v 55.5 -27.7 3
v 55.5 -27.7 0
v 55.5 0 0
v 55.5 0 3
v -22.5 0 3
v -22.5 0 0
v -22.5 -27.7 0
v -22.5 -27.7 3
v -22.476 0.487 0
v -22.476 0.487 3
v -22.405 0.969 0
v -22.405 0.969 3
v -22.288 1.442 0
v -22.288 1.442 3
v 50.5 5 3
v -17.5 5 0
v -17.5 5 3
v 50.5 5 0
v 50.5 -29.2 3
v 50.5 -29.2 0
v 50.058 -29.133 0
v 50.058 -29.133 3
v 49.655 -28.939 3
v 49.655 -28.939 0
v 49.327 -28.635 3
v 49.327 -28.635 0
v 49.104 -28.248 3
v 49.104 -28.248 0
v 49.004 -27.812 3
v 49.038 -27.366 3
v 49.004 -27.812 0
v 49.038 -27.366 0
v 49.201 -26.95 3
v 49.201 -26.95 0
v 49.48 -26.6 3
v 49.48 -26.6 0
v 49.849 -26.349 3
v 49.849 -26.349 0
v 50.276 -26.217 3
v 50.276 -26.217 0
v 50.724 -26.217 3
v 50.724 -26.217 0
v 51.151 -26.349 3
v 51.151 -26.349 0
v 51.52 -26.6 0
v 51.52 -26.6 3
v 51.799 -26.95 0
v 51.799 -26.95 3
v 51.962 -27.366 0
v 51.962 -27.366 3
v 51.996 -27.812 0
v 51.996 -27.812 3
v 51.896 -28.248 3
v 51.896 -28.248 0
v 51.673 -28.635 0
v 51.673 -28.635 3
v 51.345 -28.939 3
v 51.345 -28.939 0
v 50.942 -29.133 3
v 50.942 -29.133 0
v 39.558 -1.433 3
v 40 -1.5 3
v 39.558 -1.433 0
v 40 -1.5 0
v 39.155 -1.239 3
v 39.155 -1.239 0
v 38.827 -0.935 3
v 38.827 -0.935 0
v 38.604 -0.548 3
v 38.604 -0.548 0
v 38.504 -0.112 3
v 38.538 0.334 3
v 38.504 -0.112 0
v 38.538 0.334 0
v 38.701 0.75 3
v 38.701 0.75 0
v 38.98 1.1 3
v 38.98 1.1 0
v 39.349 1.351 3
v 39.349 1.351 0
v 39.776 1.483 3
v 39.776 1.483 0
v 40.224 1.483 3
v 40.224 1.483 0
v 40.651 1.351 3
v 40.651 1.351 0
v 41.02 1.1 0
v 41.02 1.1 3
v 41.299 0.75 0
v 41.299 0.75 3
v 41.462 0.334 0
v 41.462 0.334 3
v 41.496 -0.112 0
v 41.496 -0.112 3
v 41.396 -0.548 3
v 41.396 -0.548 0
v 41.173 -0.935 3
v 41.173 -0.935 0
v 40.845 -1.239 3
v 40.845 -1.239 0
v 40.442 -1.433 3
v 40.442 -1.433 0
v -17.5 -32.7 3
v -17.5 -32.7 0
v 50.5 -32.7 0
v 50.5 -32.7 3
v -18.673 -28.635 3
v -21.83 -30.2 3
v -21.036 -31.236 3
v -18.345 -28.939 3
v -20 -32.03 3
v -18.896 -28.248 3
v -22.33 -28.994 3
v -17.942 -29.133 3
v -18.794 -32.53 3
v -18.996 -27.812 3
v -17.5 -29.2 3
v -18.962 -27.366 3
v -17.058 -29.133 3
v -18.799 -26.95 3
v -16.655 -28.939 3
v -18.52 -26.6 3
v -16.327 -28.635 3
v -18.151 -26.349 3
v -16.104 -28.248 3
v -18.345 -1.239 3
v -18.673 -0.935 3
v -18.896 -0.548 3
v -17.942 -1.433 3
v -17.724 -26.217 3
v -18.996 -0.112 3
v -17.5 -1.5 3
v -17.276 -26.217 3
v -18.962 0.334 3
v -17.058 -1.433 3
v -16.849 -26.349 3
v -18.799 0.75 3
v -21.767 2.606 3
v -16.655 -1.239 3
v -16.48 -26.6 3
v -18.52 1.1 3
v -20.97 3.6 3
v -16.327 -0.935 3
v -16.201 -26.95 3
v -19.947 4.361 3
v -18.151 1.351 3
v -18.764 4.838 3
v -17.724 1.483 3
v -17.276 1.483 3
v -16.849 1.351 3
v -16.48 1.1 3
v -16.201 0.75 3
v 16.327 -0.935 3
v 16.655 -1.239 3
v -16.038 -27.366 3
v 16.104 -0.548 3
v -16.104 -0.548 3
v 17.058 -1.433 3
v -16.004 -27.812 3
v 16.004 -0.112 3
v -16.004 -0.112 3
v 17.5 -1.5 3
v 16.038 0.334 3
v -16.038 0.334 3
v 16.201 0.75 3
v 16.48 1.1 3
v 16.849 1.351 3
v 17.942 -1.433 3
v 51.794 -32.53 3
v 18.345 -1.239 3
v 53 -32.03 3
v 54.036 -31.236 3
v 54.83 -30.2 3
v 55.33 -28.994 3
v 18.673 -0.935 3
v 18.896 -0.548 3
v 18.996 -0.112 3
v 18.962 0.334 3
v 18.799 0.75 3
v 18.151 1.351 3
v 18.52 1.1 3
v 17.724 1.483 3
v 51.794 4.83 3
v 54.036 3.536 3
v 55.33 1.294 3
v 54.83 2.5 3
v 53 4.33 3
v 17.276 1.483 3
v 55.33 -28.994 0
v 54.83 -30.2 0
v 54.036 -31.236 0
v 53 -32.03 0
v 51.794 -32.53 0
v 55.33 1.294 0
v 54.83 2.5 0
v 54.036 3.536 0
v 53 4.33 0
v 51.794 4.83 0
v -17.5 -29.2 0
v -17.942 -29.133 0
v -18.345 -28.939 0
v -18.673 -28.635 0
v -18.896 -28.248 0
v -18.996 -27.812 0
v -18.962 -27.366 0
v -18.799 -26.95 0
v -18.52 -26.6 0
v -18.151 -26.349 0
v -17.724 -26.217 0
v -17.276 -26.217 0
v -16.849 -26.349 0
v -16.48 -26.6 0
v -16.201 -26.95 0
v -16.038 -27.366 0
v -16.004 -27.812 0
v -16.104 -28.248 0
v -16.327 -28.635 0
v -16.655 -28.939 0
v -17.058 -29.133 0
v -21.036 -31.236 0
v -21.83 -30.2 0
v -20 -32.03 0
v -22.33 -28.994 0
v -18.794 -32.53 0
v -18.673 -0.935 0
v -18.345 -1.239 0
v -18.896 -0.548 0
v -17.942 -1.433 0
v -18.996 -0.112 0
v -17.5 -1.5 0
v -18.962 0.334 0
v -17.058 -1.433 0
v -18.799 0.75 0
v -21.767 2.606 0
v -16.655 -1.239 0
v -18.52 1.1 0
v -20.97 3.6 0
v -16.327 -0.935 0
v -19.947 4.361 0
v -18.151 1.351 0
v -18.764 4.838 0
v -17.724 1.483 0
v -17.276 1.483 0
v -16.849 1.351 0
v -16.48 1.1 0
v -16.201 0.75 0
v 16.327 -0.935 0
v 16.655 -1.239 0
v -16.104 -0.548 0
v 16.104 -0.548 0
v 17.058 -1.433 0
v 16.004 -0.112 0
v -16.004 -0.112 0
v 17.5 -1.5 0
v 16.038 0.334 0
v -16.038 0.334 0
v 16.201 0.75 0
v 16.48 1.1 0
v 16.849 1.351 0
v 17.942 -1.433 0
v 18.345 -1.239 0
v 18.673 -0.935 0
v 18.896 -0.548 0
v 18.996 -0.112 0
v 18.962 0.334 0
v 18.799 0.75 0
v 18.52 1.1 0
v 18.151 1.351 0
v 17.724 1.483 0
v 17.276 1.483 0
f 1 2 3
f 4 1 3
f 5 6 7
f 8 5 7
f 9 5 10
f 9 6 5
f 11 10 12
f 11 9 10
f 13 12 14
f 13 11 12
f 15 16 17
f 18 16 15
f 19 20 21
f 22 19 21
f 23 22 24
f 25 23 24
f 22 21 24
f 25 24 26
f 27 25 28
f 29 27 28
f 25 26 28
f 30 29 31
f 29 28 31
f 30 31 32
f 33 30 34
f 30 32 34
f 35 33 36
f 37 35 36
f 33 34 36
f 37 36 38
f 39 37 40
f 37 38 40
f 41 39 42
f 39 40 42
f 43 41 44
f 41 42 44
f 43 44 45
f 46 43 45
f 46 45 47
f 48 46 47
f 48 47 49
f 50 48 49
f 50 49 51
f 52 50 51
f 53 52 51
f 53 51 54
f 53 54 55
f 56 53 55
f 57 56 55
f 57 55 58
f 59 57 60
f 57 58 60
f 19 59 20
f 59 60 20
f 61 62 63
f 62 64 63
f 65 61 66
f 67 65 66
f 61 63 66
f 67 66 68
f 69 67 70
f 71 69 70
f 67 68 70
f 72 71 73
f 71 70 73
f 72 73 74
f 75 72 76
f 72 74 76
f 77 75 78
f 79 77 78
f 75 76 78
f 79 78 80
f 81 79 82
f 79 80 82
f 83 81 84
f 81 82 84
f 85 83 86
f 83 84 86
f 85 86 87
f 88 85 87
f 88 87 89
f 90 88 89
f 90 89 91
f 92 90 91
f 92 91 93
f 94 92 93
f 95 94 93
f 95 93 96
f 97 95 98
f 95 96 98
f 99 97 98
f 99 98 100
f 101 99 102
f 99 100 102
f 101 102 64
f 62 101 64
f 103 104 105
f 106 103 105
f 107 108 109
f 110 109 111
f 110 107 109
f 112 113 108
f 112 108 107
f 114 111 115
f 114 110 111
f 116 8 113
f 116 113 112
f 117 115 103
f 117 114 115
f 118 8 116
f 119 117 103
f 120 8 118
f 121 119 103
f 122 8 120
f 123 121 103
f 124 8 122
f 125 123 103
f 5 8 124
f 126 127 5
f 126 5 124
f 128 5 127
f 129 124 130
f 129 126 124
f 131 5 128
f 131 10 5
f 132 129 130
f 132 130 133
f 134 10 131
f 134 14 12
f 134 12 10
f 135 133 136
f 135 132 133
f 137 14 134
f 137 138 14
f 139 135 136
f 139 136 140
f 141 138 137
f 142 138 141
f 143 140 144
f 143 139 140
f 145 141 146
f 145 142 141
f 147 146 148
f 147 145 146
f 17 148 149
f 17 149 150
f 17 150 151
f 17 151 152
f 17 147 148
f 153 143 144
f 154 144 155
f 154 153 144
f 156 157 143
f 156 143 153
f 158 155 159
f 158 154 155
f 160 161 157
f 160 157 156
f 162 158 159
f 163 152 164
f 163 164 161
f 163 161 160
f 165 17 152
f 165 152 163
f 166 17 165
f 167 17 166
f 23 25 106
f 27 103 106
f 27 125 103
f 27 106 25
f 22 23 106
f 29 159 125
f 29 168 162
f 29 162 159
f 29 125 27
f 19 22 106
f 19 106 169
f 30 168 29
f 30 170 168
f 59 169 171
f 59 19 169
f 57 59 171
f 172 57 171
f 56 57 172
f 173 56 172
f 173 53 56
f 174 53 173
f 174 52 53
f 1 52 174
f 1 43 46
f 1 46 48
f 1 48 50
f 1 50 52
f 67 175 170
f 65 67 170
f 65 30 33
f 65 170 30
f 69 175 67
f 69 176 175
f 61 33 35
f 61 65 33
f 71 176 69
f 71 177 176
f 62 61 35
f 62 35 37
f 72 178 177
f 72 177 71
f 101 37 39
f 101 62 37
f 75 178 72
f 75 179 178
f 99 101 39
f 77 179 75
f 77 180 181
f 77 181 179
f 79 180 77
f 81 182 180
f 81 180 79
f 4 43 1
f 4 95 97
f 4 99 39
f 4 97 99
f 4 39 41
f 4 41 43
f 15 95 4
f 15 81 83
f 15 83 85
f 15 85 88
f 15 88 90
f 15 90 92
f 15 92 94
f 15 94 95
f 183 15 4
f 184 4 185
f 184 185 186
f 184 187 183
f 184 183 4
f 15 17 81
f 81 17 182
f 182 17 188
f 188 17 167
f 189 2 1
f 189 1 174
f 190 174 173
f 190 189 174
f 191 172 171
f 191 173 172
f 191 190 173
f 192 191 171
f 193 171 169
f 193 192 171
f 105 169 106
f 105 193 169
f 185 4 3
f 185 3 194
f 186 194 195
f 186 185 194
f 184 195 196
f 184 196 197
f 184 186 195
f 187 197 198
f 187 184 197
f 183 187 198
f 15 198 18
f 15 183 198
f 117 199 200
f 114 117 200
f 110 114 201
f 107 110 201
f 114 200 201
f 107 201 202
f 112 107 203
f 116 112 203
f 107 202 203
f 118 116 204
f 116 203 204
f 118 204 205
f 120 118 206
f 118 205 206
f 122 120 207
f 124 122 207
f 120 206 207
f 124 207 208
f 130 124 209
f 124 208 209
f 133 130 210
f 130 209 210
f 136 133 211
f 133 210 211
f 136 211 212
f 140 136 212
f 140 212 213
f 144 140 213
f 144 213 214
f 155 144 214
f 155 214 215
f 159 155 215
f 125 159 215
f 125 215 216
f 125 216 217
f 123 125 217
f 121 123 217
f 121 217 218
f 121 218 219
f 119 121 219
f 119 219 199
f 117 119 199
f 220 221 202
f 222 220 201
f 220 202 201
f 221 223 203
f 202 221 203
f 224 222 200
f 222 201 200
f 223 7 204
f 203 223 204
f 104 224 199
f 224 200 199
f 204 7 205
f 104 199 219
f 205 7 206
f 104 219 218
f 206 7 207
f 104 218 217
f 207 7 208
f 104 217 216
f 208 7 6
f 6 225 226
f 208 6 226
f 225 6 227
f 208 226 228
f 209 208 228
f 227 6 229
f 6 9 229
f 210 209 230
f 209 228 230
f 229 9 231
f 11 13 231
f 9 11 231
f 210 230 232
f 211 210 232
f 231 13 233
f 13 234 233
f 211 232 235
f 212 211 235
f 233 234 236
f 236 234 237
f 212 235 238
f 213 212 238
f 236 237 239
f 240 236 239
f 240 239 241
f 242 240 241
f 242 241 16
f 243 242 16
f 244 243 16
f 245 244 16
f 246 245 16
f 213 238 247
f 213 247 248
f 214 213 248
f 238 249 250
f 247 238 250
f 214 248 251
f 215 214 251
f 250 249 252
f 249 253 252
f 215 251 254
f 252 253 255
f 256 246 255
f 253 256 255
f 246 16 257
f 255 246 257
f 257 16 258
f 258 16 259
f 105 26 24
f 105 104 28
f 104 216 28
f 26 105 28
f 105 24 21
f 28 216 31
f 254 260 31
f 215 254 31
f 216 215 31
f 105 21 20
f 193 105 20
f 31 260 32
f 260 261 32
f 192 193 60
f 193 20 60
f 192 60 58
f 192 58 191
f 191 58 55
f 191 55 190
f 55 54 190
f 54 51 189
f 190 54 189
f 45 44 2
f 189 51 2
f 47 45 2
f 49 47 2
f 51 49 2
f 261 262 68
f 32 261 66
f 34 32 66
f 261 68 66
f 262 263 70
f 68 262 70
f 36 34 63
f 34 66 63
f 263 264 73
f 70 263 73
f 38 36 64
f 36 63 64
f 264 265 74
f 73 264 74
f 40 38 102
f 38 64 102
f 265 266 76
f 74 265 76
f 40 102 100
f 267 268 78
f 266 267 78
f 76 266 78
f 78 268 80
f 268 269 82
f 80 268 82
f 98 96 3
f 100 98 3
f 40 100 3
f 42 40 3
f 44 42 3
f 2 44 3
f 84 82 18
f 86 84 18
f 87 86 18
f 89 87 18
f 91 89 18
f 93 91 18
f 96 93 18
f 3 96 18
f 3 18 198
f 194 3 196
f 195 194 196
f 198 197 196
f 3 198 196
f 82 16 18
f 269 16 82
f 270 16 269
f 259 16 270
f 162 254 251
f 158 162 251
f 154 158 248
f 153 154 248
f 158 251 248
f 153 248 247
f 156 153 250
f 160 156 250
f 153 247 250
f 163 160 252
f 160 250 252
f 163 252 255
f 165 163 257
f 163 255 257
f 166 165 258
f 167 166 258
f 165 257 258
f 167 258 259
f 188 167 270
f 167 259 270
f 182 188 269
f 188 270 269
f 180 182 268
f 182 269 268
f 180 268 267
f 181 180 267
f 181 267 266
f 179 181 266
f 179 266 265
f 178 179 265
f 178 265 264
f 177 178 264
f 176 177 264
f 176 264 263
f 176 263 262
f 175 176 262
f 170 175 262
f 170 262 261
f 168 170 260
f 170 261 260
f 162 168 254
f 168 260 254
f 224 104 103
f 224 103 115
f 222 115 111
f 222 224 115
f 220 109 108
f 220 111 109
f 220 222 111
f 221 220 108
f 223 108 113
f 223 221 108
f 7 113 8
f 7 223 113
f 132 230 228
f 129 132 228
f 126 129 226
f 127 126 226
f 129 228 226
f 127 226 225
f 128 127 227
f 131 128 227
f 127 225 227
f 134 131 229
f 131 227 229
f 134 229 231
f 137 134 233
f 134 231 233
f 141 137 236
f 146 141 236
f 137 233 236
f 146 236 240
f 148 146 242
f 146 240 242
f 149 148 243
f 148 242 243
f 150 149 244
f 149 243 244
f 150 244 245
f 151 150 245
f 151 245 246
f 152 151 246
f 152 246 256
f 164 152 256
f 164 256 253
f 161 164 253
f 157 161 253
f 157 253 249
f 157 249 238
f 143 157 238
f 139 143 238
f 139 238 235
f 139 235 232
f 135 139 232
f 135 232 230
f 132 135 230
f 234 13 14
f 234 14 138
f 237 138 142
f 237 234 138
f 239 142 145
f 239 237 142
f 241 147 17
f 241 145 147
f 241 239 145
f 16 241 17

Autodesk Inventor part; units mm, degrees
ref_plane "YZ Plane" through (0, 0, 0) normal (1, 0, 0) x (0, 1, 0)
ref_plane "XZ Plane" through (0, 0, 0) normal (0, 1, 0) x (-1, 0, 0)
ref_plane "XY Plane" through (0, 0, 0) normal (0, 0, 1) x (1, 0, 0)
sketch "スケッチ1" plane through (0, 0, 0) normal (0, 0, 1) x (1, 0, 0)
  line L0 (9.4222, 72.3) -> (45.5, 72.3) projected
  arc A0 (50.5, 67.3) -> (45.5, 72.3) centre (45.5, 67.3) ccw projected
  line L1 (50.5, 67.3) -> (50.5, 43.9148) projected
  arc A1 (45.8359, 41.4187) -> (50.5, 43.9148) centre (47.5, 43.9148) ccw projected
  line L2 (45.8359, 41.4187) -> (7.7581, 66.8038) projected
  arc A2 (9.4222, 72.3) -> (7.7581, 66.8038) centre (9.4222, 69.3) ccw projected
  line L3 (31.5778, 32.3) -> (-4.5, 32.3) projected
  arc A3 (-9.5, 37.3) -> (-4.5, 32.3) centre (-4.5, 37.3) ccw projected
  line L4 (-9.5, 37.3) -> (-9.5, 60.6852) projected
  arc A4 (-4.8359, 63.1813) -> (-9.5, 60.6852) centre (-6.5, 60.6852) ccw projected
  line L5 (-4.8359, 63.1813) -> (33.2419, 37.7962) projected
  arc A5 (31.5778, 32.3) -> (33.2419, 37.7962) centre (31.5778, 35.3) ccw projected
  arc A6 (50.5, -32.7) -> (55.5, -27.7) centre (50.5, -27.7) ccw projected
  line L6 (55.5, -27.7) -> (55.5, 77.3) projected
  line L7 (55.5, 77.3) -> (-14.5, 77.3) projected
  line L8 (-14.5, 77.3) -> (-14.5, 27.3) projected
  line L9 (-14.5, 27.3) -> (-22.2876, 1.4419) projected
  arc A7 (-16.3774, 4.8724) -> (-22.2876, 1.4419) centre (-17.5, 0) ccw projected
  arc A8 (-16.3774, 4.8724) -> (-12.2872, 6.71) centre (-15.5442, 8.4886) ccw projected
  arc A9 (-7.5, 11.8216) -> (-12.2872, 6.71) centre (0, 0) ccw projected
  line L10 (-7.5, 11.8216) -> (-7.5, 18.5) projected
  arc A10 (-1.5, 24.5) -> (-7.5, 18.5) centre (-1.5, 18.5) ccw projected
  line L11 (-1.5, 24.5) -> (42.5, 24.5) projected
  arc A11 (48.5, 18.5) -> (42.5, 24.5) centre (42.5, 18.5) ccw projected
  line L12 (48.5, 18.5) -> (48.5, -8.5) projected
  line L13 (48.5, -8.5) -> (39.5, -8.5) projected
  arc A12 (31.5, -0.5) -> (39.5, -8.5) centre (39.5, -0.5) ccw projected
  line L14 (31.5, -0.5) -> (31.5, 8.5) projected
  line L15 (31.5, 8.5) -> (11.1243, 8.5) projected
  arc A13 (12.2844, 6.7152) -> (11.1243, 8.5) centre (0, 0) ccw projected
  arc A14 (12.2844, 6.7152) -> (16.3816, 4.8733) centre (15.5493, 8.5) ccw projected
  arc A15 (17.5, -5) -> (16.3816, 4.8733) centre (17.5, 0) ccw projected
  line L16 (17.5, -5) -> (10.0995, -5) projected
  arc A16 (8.3431, -3.9565) -> (10.0995, -5) centre (10.0995, -3) ccw projected
  arc A17 (8.3431, -3.9565) -> (-8.3431, -3.9565) centre (0, -8.5) ccw projected
  arc A18 (-10.0995, -5) -> (-8.3431, -3.9565) centre (-10.0995, -3) ccw projected
  line L17 (-10.0995, -5) -> (-17.5, -5) projected
  arc A19 (-22.5, 0) -> (-17.5, -5) centre (-17.5, 0) ccw projected
  line L18 (-22.5, 0) -> (-22.5, -27.7) projected
  arc A20 (-22.5, -27.7) -> (-17.5, -32.7) centre (-17.5, -27.7) ccw projected
  line L19 (-17.5, -32.7) -> (50.5, -32.7) projected
  circle A21 centre (-17.5, -27.7) radius 1.9 projected
  circle A22 centre (50.5, -27.7) radius 1.9 projected
  line L20 (55.5, -32.7) -> (-22.5, -32.7)
  line L21 (-22.5, -32.7) -> (-22.5, 5)
  line L22 (-22.5, 5) -> (55.5, 5)
  line L23 (55.5, 5) -> (55.5, -32.7)
  arc A23 (-16.3774, 4.8724) -> (-17.5, -5) centre (-17.5, 0) ccw projected
  point P0 (0, 0)
  point P1 (-17.5, 5)
extrude "押し出し1" add sketch "スケッチ1" along normal blind 3 contours L19 A20 L18 A19 L17 A18 A17 A16 L16 A15 L22 L14 A12 L13 L12 L6 A6 | L12 L13 A12 L14 L22 | A23 A7 A8 L22 A14 A15 L16 A16 A17 A18 L17 A19 | A15 A14 L22 | L22 A8 A7 | A21 | A22
fillet "フィレット1" radius 5 1 edges at (55.5, 5, 1.5)
sketch "スケッチ2" plane through (0, 0, 3) normal (0, 0, 1) x (1, 0, 0)
  circle A0 centre (-17.5, 0) radius 1.4 projected
  circle A1 centre (-17.5, -27.7) radius 1.4 projected
  circle A2 centre (17.5, 0) radius 1.4 projected
  circle A3 centre (40, 0) radius 1.35 projected
  circle A4 centre (50.5, -27.7) radius 1.4 projected
  point P0 (0, 0)
hole "穴1" at (40, 0, 3) at (17.5, 0, 3) at (-17.5, 0, 3) at (-17.5, -27.7, 3) at (50.5, -27.7, 3) direction (0, 0, -1) diameter 3 end through all
properties part number "CaseCover"
